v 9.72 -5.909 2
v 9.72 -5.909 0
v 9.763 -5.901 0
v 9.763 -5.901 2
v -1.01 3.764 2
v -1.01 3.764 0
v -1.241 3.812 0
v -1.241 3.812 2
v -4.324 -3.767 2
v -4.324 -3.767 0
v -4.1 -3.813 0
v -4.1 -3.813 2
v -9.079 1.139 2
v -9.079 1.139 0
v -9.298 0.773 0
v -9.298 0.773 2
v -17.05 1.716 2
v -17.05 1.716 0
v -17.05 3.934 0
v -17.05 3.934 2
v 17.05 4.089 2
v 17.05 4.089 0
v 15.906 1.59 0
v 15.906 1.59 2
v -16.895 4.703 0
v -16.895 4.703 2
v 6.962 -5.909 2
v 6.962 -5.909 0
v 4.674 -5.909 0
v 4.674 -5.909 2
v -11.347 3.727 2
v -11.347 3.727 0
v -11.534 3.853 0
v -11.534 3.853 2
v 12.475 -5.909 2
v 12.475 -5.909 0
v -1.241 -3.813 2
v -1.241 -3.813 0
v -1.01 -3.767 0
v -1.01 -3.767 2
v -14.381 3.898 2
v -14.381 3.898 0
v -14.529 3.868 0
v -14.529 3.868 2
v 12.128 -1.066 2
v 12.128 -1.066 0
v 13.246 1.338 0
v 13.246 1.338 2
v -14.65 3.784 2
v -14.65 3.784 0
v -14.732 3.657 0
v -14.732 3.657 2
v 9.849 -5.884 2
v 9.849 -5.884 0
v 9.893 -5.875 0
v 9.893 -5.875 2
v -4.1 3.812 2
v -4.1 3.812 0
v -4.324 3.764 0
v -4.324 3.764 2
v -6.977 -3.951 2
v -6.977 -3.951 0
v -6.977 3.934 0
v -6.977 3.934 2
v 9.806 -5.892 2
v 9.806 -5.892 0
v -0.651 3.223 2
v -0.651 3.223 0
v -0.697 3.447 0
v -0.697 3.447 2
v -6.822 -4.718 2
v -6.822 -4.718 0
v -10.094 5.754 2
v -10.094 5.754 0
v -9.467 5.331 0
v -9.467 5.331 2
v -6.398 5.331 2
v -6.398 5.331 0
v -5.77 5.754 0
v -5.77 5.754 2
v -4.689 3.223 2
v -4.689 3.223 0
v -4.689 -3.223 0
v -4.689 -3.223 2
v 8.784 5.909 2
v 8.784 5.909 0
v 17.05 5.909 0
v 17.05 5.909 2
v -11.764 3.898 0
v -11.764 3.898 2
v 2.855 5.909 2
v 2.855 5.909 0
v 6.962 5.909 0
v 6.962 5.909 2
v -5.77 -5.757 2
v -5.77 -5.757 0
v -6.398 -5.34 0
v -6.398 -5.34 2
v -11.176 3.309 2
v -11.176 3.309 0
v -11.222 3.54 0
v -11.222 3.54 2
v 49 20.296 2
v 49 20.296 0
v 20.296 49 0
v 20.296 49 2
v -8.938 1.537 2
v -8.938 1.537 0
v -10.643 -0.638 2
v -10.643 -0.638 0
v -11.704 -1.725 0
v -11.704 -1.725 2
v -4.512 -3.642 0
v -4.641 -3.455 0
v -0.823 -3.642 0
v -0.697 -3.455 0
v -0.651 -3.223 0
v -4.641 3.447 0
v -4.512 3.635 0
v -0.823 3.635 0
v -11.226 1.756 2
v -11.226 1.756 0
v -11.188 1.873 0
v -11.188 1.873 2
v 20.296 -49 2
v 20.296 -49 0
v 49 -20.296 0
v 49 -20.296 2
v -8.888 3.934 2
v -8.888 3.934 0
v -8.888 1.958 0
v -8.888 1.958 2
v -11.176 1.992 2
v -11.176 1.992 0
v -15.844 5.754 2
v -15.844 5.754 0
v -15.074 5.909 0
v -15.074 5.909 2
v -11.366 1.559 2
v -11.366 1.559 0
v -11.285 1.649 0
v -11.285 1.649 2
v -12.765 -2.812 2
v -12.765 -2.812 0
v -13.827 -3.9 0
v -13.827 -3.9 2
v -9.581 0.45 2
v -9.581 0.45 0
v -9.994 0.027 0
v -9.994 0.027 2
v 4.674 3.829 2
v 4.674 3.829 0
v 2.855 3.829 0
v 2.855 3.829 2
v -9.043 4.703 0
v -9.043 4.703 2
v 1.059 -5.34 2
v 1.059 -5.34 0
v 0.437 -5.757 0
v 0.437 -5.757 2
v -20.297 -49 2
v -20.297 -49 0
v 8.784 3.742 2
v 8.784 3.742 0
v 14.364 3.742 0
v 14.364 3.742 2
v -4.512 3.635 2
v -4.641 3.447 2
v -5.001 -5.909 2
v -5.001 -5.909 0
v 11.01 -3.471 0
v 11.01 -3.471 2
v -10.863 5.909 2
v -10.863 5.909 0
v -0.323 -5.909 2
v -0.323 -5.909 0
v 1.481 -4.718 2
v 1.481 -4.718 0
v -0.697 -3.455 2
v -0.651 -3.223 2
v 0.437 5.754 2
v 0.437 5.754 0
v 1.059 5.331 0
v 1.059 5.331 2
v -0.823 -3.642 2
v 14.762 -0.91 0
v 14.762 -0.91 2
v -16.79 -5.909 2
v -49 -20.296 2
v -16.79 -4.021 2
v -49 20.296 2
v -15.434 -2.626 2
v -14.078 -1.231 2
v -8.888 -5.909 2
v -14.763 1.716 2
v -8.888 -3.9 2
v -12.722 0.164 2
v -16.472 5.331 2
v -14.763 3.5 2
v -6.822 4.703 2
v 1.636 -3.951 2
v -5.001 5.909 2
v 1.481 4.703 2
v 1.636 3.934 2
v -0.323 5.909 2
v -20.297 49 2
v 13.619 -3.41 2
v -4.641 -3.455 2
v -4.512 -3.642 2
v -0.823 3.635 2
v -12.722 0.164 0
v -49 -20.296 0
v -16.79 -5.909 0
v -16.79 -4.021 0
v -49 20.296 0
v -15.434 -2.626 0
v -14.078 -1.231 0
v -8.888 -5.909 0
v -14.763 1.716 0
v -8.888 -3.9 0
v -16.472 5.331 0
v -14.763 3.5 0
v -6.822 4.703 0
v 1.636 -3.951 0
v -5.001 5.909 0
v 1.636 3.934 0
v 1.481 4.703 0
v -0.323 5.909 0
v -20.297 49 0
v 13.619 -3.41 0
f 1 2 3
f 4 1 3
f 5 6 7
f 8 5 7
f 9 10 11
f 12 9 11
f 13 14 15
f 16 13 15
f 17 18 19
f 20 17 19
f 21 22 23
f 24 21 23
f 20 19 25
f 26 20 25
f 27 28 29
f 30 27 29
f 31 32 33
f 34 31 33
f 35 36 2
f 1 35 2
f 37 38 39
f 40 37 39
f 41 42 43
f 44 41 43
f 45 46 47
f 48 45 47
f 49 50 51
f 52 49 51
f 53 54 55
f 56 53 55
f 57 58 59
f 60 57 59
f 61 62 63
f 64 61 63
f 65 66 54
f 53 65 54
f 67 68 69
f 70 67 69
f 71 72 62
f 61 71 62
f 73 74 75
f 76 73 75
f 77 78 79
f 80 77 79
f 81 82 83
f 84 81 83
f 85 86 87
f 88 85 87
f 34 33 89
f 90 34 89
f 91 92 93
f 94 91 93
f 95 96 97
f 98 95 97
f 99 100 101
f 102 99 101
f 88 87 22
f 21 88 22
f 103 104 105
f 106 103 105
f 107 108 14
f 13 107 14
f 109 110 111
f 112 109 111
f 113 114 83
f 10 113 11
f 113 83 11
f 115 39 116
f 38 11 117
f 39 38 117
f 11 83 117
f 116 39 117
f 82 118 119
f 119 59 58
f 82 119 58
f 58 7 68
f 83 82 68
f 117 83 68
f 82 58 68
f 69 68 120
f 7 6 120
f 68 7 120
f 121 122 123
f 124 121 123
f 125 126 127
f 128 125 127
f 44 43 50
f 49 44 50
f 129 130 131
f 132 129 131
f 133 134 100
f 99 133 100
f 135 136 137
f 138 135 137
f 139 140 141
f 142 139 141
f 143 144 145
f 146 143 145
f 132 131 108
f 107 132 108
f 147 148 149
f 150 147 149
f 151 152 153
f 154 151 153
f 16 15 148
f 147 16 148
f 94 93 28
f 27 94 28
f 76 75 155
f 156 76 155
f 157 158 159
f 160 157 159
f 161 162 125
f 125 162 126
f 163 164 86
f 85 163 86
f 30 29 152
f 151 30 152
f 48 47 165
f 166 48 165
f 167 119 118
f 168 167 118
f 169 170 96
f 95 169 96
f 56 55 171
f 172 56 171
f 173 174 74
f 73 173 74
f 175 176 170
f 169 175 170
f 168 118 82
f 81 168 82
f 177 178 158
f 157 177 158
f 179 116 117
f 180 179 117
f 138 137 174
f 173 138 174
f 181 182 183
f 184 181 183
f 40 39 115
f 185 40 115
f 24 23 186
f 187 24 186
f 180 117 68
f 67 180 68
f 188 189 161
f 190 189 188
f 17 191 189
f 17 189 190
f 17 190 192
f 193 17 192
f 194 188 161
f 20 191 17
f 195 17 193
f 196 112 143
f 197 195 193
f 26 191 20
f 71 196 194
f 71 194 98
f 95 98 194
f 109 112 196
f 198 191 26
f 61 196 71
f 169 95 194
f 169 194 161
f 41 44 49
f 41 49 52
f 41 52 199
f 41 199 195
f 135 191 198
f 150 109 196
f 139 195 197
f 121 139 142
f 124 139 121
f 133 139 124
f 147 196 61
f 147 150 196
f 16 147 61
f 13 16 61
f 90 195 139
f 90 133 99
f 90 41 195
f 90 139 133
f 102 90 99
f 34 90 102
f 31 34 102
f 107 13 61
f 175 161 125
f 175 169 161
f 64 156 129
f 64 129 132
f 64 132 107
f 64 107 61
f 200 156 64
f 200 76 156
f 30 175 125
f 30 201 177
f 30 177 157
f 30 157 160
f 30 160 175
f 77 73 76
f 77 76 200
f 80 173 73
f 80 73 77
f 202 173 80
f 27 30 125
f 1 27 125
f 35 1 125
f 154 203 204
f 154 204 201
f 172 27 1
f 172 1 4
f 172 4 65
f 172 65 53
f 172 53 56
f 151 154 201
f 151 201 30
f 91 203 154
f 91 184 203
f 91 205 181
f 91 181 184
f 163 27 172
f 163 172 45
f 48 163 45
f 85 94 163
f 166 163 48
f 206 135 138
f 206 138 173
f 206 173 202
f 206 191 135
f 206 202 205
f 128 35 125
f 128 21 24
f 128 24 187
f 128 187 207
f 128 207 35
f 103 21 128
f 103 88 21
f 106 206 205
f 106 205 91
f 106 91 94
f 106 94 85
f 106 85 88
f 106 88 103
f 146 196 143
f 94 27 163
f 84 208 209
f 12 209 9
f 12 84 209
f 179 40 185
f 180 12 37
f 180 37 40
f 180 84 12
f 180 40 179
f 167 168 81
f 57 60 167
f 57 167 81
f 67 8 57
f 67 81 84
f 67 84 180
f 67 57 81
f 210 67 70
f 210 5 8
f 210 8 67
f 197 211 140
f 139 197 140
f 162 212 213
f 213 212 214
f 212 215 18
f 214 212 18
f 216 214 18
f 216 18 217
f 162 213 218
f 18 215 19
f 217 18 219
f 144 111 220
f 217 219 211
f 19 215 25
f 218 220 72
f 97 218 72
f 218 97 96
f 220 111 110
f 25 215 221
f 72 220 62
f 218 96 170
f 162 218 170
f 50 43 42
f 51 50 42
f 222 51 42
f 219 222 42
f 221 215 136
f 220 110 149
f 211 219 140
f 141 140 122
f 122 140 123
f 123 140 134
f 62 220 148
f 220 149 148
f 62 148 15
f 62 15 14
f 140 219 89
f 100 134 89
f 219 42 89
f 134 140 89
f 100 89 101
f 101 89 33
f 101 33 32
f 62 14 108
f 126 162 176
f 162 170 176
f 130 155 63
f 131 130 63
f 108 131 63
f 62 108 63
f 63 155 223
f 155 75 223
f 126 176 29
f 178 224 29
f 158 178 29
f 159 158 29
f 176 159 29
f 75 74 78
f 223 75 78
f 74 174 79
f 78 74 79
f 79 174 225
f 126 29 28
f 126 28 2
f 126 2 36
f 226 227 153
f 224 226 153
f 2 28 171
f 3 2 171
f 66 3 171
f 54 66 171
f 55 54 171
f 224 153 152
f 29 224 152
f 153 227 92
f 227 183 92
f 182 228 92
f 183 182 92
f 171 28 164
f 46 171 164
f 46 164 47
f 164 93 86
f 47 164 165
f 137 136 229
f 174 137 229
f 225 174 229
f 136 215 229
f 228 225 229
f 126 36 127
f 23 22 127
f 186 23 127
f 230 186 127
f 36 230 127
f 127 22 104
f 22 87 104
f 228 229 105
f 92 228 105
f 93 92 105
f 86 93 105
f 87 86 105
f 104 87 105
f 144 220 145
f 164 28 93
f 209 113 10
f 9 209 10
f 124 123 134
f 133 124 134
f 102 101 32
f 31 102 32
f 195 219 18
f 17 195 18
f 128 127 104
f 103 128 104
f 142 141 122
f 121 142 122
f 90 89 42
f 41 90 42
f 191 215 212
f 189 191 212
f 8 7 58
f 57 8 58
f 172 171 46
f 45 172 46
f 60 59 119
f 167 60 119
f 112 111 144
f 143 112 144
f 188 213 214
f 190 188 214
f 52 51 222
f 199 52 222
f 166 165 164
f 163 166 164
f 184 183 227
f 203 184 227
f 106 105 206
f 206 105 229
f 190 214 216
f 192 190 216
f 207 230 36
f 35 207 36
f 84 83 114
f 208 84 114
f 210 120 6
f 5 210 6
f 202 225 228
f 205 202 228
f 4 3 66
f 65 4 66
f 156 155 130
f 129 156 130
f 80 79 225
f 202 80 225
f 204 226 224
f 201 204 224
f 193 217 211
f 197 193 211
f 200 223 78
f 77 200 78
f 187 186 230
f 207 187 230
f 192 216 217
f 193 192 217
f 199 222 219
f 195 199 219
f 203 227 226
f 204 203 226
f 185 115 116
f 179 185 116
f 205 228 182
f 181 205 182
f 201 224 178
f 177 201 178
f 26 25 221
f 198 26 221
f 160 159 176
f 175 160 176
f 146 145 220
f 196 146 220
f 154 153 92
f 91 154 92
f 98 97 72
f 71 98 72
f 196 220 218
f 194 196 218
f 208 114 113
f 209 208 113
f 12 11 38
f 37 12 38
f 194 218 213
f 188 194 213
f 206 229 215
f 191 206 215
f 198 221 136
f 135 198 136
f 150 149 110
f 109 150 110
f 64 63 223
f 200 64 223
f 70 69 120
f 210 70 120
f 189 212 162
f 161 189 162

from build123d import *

# Parameters (mm, degrees)
F1_DEPTH = 2


with BuildPart() as f1:
    # F0 (on Top) → F1 (new body)
    with BuildSketch(Plane.XY):
        Polygon((48.999987, 20.296367), (20.296189, 49.000176), (-20.296909, 49.000176), (-49.000013, 20.296367), (-49.000013, -20.296377), (-20.296909, -49.000176), (20.296189, -49.000176), (48.999987, -20.296377), align=None)
        Polygon((-16.477957, 1.715611), (-17.049831, 1.715611), (-17.049831, 2.270141), (-17.049831, 2.82467), (-17.049831, 3.3792), (-17.049831, 3.933729), (-16.894637, 4.702583), (-16.471545, 5.330637), (-15.843671, 5.7539), (-15.074294, 5.909095), (-14.021587, 5.909095), (-12.968709, 5.909095), (-11.916002, 5.909095), (-10.863295, 5.909095), (-10.094271, 5.7539), (-9.466568, 5.330637), (-9.043476, 4.702583), (-8.888282, 3.933729), (-8.888282, 3.439719), (-8.888282, 2.945709), (-8.888282, 2.451689), (-8.888282, 1.957679), (-8.93804, 1.537013), (-9.07885, 1.138886), (-9.297503, 0.773363), (-9.581185, 0.449798), (-9.994049, 0.026877), (-10.64273, -0.637587), (-11.704104, -1.724973), (-12.765488, -2.812359), (-13.827033, -3.899745), (-12.592436, -3.899745), (-11.357658, -3.899745), (-10.122879, -3.899745), (-8.888282, -3.899745), (-8.888282, -4.402261), (-8.888282, -4.904596), (-8.888282, -5.406931), (-8.888282, -5.909447), (-10.863819, -5.909447), (-12.839356, -5.909447), (-14.814711, -5.909447), (-16.790248, -5.909447), (-16.790248, -5.437452), (-16.790248, -4.965286), (-16.790248, -4.49312), (-16.790248, -4.021126), (-15.434441, -2.62613), (-14.078463, -1.231134), (-12.722484, 0.163861), (-11.366496, 1.558857), (-11.285351, 1.64868), (-11.225526, 1.756189), (-11.188421, 1.873403), (-11.175757, 1.992005), (-11.175757, 2.321298), (-11.175757, 2.650581), (-11.175757, 2.979864), (-11.175757, 3.309147), (-11.221539, 3.540293), (-11.346736, 3.727387), (-11.533659, 3.852584), (-11.764452, 3.898356), (-12.41869, 3.898356), (-13.072917, 3.898356), (-13.727154, 3.898356), (-14.381392, 3.898356), (-14.528603, 3.867844), (-14.649984, 3.783739), (-14.732348, 3.657335), (-14.762698, 3.499544), (-14.762698, 3.053561), (-14.762698, 2.607578), (-14.762698, 2.161595), (-14.762698, 1.715611), (-15.334562, 1.715611), (-15.906264, 1.715611), align=None, mode=Mode.SUBTRACT)
        Polygon((1.480814, 4.702583), (1.635666, 3.933729), (1.635666, 1.962531), (1.635666, -0.008667), (1.635666, -1.979875), (1.635666, -3.951073), (1.480814, -4.717672), (1.059454, -5.339657), (0.436785, -5.757202), (-0.322536, -5.909447), (-1.492114, -5.909447), (-2.661692, -5.909447), (-3.83127, -5.909447), (-5.000839, -5.909447), (-5.770216, -5.757202), (-6.39827, -5.339657), (-6.821533, -4.717672), (-6.976728, -3.951073), (-6.976728, -1.979875), (-6.976728, -0.008667), (-6.976728, 1.962531), (-6.976728, 2.995638), (-6.976728, 3.933729), (-6.821533, 4.702583), (-6.39827, 5.330637), (-5.770216, 5.7539), (-5.000839, 5.909095), (-3.83127, 5.909095), (-2.661692, 5.909095), (-1.492114, 5.909095), (-0.322536, 5.909095), (0.436785, 5.7539), (1.059454, 5.330637), align=None, mode=Mode.SUBTRACT)
        Polygon((2.854661, 5.389073), (2.854661, 5.909095), (3.881527, 5.909095), (4.908222, 5.909095), (5.934917, 5.909095), (6.961794, 5.909095), (6.961794, 2.954376), (6.961794, -0.000171), (6.961794, -2.954718), (6.961794, -5.909447), (6.38992, -5.909447), (5.817704, -5.909447), (5.24583, -5.909447), (4.673966, -5.909447), (4.673966, -3.474921), (4.673966, -1.040225), (4.673966, 1.394472), (4.673966, 3.828998), (4.219135, 3.828998), (3.764313, 3.828998), (3.309482, 3.828998), (2.854661, 3.828998), (2.854661, 4.34902), (2.854661, 4.869051), align=None, mode=Mode.SUBTRACT)
        Polygon((8.783526, 5.3674), (8.783526, 5.909095), (10.850093, 5.909095), (12.91666, 5.909095), (14.983238, 5.909095), (17.049805, 5.909095), (17.049805, 5.454092), (17.049805, 4.999271), (17.049805, 4.544449), (17.049805, 4.089447), (15.906068, 1.589721), (14.76233, -0.909995), (13.618583, -3.409721), (12.475187, -5.909447), (11.7861, -5.909447), (11.097365, -5.909447), (10.40862, -5.909447), (9.719532, -5.909447), (9.762878, -5.90077), (9.805882, -5.892102), (9.849238, -5.883778), (9.892584, -5.87511), (11.01031, -3.470754), (12.128046, -1.066407), (13.245772, 1.337949), (14.363508, 3.742296), (12.968684, 3.742296), (11.573517, 3.742296), (10.17835, 3.742296), (8.783526, 3.742296), (8.783526, 4.284), (8.783526, 4.825695), align=None, mode=Mode.SUBTRACT)
        Polygon((-4.689424, -1.611917), (-4.689424, -3.223492), (-4.641215, -3.454627), (-4.511681, -3.641732), (-4.323549, -3.766928), (-4.099511, -3.8127), (-3.384935, -3.8127), (-2.67036, -3.8127), (-1.955784, -3.8127), (-1.241198, -3.8127), (-1.009892, -3.766928), (-0.822616, -3.641732), (-0.697078, -3.454627), (-0.651296, -3.223492), (-0.651296, -1.611917), (-0.651296, -0.000352), (-0.651296, 1.611223), (-0.651296, 3.222798), (-0.697078, 3.446655), (-0.822616, 3.634615), (-1.009892, 3.76415), (-1.241198, 3.812358), (-1.955784, 3.812358), (-2.67036, 3.812358), (-3.384935, 3.812358), (-4.099511, 3.812358), (-4.323549, 3.76415), (-4.511681, 3.634615), (-4.641215, 3.446655), (-4.689424, 3.222798), (-4.689424, 1.611223), (-4.689424, -0.000352), align=None)
    extrude(amount=F1_DEPTH)


solid = f1.part
